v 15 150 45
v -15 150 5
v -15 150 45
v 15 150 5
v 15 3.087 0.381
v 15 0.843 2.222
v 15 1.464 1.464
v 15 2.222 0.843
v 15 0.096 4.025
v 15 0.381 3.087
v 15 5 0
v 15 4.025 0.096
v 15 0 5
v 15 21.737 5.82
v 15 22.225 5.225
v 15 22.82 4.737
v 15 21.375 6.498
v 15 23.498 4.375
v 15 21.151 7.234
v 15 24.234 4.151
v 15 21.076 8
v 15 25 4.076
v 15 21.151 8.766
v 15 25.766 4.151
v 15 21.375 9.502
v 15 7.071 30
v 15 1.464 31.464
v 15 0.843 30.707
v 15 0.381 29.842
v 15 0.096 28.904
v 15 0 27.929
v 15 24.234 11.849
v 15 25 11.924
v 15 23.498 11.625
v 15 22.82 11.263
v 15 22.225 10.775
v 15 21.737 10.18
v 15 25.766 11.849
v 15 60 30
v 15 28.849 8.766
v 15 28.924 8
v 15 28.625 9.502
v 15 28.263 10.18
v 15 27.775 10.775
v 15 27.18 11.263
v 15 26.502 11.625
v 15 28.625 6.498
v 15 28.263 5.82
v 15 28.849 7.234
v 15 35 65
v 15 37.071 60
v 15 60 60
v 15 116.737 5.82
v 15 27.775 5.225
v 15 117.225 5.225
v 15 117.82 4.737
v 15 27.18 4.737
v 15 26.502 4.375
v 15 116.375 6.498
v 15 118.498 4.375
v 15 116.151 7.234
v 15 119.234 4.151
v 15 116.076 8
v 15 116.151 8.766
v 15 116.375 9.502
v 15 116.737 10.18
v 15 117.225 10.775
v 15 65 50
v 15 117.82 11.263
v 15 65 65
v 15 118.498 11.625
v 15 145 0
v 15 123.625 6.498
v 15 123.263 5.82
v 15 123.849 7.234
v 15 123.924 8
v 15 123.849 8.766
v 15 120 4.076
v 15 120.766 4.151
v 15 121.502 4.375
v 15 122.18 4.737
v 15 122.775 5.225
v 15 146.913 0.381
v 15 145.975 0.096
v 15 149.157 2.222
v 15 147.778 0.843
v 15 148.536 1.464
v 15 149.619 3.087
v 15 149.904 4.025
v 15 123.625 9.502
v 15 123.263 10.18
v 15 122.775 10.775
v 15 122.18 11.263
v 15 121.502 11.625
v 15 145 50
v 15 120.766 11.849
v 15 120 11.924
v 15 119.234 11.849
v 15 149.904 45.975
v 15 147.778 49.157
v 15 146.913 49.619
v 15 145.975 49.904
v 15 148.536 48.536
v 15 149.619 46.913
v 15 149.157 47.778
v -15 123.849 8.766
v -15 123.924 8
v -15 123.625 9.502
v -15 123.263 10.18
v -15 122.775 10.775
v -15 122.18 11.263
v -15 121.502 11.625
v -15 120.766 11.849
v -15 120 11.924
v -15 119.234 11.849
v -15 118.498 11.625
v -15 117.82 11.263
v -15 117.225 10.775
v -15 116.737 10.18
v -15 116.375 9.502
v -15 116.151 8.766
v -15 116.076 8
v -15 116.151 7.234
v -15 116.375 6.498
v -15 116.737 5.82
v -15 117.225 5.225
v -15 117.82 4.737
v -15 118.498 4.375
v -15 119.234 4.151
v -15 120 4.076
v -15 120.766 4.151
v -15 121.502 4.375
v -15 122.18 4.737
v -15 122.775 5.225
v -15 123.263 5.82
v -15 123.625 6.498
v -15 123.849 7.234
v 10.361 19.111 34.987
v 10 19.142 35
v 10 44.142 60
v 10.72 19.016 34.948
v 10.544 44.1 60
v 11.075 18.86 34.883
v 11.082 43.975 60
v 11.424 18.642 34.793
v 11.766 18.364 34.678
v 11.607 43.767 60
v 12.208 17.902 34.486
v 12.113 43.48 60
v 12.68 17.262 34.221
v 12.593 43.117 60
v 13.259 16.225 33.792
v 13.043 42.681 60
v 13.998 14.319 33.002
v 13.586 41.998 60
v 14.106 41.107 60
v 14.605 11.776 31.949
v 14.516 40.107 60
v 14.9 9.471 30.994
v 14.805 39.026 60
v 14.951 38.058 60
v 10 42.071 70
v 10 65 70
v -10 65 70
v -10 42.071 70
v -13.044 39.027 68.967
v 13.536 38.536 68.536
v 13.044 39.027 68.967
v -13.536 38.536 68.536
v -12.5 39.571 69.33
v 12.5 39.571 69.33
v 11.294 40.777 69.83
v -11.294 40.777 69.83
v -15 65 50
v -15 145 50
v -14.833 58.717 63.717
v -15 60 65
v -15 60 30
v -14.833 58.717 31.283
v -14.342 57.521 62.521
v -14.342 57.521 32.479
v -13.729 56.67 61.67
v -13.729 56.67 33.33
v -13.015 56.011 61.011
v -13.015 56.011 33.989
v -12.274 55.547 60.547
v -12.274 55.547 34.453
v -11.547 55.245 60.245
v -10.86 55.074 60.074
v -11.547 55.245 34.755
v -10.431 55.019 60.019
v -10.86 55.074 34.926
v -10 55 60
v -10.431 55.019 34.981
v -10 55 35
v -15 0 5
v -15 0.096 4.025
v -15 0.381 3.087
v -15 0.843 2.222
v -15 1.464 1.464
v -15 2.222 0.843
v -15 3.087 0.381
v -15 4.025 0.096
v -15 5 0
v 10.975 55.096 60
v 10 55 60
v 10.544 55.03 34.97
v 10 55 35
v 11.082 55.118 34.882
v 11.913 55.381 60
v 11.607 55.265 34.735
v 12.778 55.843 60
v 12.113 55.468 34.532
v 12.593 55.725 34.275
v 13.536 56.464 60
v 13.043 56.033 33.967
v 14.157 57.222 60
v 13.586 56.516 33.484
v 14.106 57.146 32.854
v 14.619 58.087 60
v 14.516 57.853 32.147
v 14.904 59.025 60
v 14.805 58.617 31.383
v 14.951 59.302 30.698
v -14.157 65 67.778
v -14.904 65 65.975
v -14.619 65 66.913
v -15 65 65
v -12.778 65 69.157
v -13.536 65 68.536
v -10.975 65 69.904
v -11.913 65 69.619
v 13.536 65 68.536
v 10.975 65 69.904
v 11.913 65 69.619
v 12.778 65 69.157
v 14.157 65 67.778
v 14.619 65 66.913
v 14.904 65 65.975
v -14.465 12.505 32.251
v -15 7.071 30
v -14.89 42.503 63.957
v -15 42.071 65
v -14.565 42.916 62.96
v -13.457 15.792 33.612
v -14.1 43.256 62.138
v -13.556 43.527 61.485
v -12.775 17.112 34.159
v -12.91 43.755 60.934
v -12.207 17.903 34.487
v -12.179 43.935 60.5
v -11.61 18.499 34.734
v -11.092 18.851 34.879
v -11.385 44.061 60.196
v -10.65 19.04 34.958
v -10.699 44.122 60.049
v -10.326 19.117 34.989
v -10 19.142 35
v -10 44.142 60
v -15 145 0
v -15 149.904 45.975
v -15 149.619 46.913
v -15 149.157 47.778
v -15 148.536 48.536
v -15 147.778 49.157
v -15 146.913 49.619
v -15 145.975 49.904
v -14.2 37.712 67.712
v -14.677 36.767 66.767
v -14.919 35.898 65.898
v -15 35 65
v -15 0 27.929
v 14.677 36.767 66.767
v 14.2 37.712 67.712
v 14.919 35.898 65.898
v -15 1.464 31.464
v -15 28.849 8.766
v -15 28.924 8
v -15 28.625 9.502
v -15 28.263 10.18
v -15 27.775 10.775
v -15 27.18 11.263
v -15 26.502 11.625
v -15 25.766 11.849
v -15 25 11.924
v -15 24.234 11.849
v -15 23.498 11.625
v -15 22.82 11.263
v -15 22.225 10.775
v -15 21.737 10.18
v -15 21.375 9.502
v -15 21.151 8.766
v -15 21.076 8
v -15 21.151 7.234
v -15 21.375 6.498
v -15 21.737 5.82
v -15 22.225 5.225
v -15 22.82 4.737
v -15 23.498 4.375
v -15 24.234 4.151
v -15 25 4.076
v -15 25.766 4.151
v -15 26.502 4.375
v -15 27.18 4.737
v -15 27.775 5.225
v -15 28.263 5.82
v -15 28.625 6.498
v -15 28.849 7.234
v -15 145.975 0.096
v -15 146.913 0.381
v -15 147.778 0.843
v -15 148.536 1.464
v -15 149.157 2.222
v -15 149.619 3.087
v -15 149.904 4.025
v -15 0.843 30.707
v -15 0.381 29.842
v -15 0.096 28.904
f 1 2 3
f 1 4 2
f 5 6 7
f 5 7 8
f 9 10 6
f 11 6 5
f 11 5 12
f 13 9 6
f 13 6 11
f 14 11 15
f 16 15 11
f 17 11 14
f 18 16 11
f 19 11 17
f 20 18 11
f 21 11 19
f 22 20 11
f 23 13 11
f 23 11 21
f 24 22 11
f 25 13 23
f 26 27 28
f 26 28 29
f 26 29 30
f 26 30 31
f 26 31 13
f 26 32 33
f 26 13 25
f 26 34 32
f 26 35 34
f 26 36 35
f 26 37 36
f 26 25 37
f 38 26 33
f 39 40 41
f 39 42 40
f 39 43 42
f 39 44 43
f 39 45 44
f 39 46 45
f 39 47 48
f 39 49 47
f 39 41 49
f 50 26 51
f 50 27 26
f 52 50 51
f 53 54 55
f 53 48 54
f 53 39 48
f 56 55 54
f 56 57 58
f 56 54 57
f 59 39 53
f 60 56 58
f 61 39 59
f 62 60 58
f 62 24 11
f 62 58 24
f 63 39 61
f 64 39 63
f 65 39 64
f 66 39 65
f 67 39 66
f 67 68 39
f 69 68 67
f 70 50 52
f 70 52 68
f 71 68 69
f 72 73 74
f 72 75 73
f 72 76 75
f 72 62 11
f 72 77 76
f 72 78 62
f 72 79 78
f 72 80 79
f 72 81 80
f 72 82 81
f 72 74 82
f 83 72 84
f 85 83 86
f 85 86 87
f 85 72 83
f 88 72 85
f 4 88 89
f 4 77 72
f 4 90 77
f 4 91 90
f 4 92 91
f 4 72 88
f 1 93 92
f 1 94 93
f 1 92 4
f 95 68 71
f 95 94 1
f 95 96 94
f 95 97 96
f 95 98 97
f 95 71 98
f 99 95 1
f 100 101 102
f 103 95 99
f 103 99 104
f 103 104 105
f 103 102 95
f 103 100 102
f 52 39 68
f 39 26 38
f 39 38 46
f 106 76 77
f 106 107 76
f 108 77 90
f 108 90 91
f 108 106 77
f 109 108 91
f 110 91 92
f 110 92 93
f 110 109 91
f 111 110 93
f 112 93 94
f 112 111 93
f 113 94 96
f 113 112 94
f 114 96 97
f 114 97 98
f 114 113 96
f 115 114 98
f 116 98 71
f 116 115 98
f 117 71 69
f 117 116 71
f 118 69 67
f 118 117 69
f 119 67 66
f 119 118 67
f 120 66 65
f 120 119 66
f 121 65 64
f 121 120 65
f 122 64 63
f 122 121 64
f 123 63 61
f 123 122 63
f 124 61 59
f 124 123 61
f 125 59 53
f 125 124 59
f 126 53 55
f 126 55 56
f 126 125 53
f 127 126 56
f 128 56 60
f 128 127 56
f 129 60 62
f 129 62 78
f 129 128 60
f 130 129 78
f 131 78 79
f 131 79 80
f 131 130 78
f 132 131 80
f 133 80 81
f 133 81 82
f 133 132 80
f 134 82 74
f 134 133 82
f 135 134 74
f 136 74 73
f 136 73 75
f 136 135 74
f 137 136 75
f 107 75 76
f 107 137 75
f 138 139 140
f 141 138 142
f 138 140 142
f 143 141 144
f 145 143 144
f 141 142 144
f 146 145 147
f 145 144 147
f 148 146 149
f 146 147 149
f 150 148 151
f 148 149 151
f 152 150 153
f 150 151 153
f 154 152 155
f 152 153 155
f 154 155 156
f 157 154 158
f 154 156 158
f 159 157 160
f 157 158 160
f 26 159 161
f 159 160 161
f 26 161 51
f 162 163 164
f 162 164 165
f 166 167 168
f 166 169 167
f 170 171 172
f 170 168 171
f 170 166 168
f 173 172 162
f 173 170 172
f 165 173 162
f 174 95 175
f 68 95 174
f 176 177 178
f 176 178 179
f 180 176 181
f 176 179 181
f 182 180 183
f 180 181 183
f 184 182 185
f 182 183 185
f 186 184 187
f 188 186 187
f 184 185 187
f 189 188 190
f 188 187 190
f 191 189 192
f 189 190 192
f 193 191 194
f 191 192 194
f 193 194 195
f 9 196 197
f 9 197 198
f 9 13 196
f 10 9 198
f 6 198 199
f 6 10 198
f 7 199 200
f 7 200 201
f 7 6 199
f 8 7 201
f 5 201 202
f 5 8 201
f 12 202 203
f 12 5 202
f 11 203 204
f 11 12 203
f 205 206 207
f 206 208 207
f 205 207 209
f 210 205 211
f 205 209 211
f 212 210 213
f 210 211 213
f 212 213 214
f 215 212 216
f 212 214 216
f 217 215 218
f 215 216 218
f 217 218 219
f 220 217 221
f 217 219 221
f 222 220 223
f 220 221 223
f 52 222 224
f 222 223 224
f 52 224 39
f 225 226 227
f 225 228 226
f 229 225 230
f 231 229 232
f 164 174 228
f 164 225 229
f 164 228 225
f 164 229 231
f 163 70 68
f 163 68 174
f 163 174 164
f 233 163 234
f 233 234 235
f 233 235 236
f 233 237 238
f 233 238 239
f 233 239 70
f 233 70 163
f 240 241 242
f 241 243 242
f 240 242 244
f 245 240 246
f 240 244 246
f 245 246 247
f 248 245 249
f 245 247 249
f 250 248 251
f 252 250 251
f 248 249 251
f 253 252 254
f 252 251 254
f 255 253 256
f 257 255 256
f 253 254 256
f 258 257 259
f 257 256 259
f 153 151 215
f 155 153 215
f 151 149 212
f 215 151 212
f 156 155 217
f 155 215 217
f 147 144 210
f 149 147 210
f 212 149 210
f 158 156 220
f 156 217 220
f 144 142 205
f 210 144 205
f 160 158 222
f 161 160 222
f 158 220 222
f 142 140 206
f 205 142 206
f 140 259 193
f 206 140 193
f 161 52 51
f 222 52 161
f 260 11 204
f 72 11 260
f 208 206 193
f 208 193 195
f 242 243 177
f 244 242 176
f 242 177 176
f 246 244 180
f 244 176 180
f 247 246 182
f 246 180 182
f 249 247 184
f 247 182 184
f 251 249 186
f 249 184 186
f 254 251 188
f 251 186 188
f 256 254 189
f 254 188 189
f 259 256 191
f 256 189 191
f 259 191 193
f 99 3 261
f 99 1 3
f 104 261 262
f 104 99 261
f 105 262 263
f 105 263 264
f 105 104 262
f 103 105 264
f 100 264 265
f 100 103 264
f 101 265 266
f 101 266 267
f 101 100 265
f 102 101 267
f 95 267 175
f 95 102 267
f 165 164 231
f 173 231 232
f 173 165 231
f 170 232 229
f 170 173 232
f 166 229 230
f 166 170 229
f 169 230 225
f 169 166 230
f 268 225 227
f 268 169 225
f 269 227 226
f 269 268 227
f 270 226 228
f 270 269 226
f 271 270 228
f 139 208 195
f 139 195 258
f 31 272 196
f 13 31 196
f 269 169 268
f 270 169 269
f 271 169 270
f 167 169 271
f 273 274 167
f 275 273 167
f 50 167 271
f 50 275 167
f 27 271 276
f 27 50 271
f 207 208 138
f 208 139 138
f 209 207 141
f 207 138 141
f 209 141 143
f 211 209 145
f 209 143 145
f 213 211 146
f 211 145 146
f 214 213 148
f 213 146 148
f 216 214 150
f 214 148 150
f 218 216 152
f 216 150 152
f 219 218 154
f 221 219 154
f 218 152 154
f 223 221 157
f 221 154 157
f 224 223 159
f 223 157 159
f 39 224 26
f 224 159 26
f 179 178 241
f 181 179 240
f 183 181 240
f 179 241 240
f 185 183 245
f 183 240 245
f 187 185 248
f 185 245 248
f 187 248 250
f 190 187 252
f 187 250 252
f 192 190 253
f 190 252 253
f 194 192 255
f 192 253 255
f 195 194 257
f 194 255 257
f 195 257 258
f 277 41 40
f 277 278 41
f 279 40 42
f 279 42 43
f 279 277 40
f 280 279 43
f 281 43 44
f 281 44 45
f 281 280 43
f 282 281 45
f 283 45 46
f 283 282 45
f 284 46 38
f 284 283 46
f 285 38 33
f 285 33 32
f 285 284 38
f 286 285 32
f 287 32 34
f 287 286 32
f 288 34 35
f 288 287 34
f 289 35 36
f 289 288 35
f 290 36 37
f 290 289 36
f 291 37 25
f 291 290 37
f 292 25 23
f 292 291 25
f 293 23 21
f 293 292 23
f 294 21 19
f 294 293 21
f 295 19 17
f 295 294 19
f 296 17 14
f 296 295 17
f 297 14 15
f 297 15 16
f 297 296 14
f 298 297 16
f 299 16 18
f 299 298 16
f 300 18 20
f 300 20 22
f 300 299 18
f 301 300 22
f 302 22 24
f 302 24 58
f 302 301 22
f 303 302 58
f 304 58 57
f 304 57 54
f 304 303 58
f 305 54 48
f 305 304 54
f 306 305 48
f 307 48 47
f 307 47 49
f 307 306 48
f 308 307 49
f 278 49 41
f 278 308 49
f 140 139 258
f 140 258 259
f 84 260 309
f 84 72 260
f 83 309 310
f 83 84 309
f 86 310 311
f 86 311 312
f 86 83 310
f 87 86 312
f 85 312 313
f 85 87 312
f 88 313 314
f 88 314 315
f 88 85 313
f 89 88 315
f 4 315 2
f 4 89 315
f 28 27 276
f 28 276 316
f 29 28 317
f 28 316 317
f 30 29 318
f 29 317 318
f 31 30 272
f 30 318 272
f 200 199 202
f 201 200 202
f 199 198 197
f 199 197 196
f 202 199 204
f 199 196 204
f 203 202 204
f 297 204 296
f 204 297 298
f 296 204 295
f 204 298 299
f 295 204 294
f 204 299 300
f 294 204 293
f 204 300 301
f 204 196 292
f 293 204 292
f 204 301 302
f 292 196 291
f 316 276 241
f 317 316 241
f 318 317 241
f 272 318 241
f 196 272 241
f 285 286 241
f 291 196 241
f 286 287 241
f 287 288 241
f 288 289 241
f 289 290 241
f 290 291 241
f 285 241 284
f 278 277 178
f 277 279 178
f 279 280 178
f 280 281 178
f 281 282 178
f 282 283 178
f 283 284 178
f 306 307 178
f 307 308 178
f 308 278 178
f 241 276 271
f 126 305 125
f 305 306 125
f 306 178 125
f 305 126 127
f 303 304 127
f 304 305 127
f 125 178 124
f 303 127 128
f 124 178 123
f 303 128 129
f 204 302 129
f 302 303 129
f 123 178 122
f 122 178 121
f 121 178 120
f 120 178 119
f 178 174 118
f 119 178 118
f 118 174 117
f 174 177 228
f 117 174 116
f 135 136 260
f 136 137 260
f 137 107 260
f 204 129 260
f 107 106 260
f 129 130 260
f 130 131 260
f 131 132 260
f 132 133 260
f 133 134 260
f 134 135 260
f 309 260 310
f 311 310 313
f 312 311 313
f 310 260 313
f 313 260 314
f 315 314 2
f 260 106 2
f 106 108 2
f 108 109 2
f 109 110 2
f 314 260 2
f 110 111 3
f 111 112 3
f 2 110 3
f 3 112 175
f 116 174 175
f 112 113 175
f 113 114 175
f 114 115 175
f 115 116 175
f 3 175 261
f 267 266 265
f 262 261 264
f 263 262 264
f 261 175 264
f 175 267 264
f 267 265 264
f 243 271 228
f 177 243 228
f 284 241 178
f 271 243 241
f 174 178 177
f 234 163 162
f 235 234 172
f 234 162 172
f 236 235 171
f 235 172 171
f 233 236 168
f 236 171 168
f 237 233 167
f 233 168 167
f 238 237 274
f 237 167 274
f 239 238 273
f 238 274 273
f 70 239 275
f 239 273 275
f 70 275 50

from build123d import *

# Parameters (mm, degrees)
F0_R     = 3.923916639
F1_DEPTH = 15
F2_R     = 5
F2_R_2   = 4.99999


# Not quite as in the source:
# - a fillet or chamfer is up to 0.001 mm smaller than in the source, because OpenCascade refuses the exact size


with BuildPart() as f1:
    # F0 (on Right) → F1 (new body, symmetric)
    with BuildSketch(Plane.YZ):
        Polygon((0, 30), (0, 0), (150, 0), (150, 50), (65, 50), (65, 70), (40, 70), align=None)
        with Locations((25, 8)):
            Circle(F0_R, mode=Mode.SUBTRACT)
        with Locations((120, 8)):
            Circle(F0_R, mode=Mode.SUBTRACT)
        Polygon((44.1421356237, 60), (55, 60), (55, 35), (19.1421356237, 35), align=None, mode=Mode.SUBTRACT)
    extrude(amount=F1_DEPTH, both=True)

    # F2 (call 1 of 7: OpenCascade refuses the feature's edges together)
    f2_edges = [f1.edges().sort_by_distance(p)[0] for p in [
        (15, 52.5, 70),
        (0, 40, 70),
        (-15, 52.5, 70),
    ]]
    fillet(f2_edges, radius=F2_R)

    # F2#2 (call 2 of 7)
    f2_2_edges = [f1.edges().sort_by_distance(p)[0] for p in [
        (0, 0, 30),
    ]]
    fillet(f2_2_edges, radius=F2_R)

    # F2#3 (call 3 of 7)
    f2_3_edges = [f1.edges().sort_by_distance(p)[0] for p in [
        (0, 0, 0),
    ]]
    fillet(f2_3_edges, radius=F2_R)

    # F2#4 (call 4 of 7)
    f2_4_edges = [f1.edges().sort_by_distance(p)[0] for p in [
        (0, 150, 50),
    ]]
    fillet(f2_4_edges, radius=F2_R)

    # F2#5 (call 5 of 7) (radius 5 in the source; OpenCascade refuses exactly that, so slightly less here)
    f2_5_edges = [f1.edges().sort_by_distance(p)[0] for p in [
        (-15, 37.071068, 35),
        (-15, 55, 47.5),
        (-15, 49.571068, 60),
        (-15, 31.642136, 47.5),
    ]]
    fillet(f2_5_edges, radius=F2_R_2)

    # F2#6 (call 6 of 7)
    f2_6_edges = [f1.edges().sort_by_distance(p)[0] for p in [
        (15, 37.071068, 35),
        (15, 55, 47.5),
        (15, 31.642136, 47.5),
    ]]
    fillet(f2_6_edges, radius=F2_R)

    # F2#7 (call 7 of 7)
    f2_7_edges = [f1.edges().sort_by_distance(p)[0] for p in [
        (0, 150, 0),
    ]]
    fillet(f2_7_edges, radius=F2_R)


solid = f1.part
